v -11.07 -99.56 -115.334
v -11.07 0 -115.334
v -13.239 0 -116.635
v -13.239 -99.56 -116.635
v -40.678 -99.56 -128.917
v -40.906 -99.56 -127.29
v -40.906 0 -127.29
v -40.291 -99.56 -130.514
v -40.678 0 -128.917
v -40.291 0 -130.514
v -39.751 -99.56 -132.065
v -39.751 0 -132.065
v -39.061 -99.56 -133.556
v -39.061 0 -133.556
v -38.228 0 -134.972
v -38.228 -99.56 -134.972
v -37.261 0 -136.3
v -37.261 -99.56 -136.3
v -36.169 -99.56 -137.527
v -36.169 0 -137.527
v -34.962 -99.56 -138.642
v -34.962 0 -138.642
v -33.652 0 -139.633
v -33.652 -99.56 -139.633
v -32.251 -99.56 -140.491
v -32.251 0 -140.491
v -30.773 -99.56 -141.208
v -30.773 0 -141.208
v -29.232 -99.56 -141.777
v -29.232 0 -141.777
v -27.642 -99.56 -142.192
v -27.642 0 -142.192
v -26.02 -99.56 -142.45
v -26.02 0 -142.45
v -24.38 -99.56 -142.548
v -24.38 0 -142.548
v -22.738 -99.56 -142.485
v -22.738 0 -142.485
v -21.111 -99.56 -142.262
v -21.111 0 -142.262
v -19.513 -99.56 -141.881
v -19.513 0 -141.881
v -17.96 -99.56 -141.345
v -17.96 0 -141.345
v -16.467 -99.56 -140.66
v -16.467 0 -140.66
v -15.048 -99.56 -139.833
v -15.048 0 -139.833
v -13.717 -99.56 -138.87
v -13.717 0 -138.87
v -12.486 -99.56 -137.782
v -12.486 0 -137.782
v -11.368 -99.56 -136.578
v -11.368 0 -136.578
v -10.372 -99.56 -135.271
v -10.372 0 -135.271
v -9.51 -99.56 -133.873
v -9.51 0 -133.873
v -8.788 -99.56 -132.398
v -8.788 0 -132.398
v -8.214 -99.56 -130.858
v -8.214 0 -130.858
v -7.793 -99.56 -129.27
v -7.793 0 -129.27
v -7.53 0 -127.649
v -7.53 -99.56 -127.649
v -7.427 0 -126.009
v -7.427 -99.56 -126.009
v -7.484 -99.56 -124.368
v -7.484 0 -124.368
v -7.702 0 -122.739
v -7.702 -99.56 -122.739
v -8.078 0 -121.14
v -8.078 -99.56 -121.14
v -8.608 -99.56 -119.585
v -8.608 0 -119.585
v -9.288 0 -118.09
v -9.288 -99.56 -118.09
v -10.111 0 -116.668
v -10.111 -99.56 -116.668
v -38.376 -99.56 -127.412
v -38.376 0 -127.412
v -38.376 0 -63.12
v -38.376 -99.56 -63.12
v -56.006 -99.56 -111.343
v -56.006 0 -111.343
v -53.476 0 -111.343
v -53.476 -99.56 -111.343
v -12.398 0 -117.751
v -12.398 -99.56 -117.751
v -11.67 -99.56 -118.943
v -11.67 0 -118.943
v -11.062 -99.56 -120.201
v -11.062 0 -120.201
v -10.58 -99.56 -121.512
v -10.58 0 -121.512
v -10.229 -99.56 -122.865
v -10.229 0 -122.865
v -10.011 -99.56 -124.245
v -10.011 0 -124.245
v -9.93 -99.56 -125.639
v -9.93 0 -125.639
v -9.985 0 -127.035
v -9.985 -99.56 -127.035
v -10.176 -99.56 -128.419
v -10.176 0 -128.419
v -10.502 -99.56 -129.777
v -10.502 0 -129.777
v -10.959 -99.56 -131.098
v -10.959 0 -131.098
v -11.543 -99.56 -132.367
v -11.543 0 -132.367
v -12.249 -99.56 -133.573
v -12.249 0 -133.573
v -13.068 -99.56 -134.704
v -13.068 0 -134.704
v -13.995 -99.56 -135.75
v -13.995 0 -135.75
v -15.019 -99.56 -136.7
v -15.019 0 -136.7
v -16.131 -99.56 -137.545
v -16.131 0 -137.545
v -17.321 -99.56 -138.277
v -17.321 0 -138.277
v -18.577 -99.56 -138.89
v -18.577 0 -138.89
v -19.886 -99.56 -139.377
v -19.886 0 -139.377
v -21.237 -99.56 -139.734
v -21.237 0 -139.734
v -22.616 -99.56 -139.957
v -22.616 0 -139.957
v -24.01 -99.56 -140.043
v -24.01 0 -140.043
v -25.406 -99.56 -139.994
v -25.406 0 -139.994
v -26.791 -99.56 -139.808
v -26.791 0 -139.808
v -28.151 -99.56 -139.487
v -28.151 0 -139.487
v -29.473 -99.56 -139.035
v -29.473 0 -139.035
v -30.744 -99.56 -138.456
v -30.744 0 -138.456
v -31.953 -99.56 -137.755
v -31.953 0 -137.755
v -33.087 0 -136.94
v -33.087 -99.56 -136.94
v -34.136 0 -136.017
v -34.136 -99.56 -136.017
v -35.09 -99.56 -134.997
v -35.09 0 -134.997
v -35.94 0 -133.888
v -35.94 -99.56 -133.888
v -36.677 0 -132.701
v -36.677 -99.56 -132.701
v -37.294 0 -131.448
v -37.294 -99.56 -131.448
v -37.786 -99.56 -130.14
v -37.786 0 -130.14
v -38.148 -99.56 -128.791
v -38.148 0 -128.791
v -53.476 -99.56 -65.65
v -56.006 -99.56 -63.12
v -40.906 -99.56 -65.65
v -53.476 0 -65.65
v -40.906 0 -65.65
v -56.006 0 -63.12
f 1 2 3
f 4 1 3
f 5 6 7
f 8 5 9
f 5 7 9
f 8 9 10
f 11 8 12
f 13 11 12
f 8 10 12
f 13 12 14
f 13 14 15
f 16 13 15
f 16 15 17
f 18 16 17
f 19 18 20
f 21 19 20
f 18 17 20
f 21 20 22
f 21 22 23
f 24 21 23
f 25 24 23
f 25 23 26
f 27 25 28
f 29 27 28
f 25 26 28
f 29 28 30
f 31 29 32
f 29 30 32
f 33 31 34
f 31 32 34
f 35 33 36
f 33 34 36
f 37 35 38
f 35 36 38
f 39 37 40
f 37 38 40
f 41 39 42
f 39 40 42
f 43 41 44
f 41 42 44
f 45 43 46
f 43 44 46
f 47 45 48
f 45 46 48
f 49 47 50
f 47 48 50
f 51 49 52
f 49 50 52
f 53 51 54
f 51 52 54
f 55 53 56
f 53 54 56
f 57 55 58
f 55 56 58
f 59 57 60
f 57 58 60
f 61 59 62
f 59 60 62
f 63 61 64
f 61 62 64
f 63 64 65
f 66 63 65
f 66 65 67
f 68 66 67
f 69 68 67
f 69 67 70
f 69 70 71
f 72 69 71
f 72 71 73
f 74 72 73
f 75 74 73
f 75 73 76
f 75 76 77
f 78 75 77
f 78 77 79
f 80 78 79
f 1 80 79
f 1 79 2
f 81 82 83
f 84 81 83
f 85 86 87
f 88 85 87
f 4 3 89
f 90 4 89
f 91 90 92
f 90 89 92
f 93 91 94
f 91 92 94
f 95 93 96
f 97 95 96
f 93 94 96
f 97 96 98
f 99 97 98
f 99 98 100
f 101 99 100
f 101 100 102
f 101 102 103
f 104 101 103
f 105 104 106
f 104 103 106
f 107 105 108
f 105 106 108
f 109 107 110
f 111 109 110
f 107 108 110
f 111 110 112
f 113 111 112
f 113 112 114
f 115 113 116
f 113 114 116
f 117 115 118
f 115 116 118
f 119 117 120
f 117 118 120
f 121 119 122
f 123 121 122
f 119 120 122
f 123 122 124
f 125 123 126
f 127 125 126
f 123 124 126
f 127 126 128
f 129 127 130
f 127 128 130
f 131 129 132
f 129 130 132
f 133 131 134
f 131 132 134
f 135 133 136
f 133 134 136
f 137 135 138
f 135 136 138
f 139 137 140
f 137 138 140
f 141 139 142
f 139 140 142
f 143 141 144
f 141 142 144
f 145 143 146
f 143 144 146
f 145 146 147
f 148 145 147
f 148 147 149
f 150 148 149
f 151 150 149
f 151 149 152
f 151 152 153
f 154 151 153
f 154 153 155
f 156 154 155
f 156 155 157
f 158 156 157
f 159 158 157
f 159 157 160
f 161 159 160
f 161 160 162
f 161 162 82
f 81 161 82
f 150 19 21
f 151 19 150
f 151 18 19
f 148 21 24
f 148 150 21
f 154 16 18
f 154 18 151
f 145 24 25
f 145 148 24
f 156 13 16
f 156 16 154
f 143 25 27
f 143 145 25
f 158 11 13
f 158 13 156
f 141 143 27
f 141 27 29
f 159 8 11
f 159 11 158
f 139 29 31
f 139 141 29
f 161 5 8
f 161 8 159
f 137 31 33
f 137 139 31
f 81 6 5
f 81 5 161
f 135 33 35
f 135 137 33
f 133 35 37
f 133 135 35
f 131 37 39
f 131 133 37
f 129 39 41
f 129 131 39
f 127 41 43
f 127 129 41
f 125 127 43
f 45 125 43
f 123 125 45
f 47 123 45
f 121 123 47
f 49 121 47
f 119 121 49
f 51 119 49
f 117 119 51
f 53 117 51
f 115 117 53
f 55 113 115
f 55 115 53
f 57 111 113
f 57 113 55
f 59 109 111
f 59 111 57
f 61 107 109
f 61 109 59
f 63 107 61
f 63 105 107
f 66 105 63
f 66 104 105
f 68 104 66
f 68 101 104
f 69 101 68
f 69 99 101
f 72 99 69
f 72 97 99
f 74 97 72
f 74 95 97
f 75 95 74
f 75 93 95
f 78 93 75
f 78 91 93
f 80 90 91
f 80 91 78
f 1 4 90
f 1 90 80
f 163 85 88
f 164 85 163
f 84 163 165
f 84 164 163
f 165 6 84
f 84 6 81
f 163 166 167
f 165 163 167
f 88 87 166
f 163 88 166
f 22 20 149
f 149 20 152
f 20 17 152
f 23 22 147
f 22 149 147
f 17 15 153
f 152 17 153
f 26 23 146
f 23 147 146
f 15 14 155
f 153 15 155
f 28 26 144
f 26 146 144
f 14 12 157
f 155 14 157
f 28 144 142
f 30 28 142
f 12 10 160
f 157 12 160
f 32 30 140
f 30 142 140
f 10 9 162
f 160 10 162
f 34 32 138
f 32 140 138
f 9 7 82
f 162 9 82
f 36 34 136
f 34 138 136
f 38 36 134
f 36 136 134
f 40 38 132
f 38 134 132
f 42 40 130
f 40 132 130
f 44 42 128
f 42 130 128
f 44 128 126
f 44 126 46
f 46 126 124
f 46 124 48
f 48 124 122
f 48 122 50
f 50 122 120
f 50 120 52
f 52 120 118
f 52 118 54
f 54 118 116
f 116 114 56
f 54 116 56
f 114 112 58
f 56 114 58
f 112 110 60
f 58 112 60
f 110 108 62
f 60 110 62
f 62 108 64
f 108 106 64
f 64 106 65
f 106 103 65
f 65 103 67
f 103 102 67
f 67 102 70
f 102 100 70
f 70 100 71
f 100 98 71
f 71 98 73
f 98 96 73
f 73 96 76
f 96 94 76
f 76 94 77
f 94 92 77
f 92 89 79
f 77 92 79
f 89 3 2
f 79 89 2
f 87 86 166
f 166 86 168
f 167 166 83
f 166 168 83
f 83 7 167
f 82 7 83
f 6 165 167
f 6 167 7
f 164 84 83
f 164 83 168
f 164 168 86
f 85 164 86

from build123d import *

# Parameters (mm, degrees)
F1_DEPTH = 99.56


# Not quite as in the source:
# - the program builds the solid bodies; features that only make, move or delete a surface that nothing else refers to are left out


with BuildPart() as f1:
    # F0 (on Front) → F1 (new body)
    with BuildSketch(Plane.XZ):
        with BuildLine():
            Line((-53.4761890293, -65.6504866451), (-40.9061890293, -65.6504866451))
            Line((-40.9061890293, -65.6504866451), (-40.9061890293, -127.2904866451))
            ThreePointArc((-40.9061890293, -127.2904866451), (-17.9599684542, -141.3452802415), (-11.0695237566, -115.3339743614))
            Line((-11.0695237566, -115.3339743614), (-13.2391586559, -116.635352248))
            ThreePointArc((-13.2391586559, -116.635352248), (-18.5765544792, -138.8900687432), (-38.3761890293, -127.4124961715))
            Line((-38.3761890293, -127.4124961715), (-38.3761890293, -63.1204866451))
            Line((-38.3761890293, -63.1204866451), (-56.0061890293, -63.1204866451))
            Line((-56.0061890293, -63.1204866451), (-56.0061890293, -111.3434480185))
            Line((-56.0061890293, -111.3434480185), (-53.4761890293, -111.3434480185))
            Line((-53.4761890293, -111.3434480185), (-53.4761890293, -65.6504866451))
        make_face()
    extrude(amount=F1_DEPTH)


solid = f1.part
